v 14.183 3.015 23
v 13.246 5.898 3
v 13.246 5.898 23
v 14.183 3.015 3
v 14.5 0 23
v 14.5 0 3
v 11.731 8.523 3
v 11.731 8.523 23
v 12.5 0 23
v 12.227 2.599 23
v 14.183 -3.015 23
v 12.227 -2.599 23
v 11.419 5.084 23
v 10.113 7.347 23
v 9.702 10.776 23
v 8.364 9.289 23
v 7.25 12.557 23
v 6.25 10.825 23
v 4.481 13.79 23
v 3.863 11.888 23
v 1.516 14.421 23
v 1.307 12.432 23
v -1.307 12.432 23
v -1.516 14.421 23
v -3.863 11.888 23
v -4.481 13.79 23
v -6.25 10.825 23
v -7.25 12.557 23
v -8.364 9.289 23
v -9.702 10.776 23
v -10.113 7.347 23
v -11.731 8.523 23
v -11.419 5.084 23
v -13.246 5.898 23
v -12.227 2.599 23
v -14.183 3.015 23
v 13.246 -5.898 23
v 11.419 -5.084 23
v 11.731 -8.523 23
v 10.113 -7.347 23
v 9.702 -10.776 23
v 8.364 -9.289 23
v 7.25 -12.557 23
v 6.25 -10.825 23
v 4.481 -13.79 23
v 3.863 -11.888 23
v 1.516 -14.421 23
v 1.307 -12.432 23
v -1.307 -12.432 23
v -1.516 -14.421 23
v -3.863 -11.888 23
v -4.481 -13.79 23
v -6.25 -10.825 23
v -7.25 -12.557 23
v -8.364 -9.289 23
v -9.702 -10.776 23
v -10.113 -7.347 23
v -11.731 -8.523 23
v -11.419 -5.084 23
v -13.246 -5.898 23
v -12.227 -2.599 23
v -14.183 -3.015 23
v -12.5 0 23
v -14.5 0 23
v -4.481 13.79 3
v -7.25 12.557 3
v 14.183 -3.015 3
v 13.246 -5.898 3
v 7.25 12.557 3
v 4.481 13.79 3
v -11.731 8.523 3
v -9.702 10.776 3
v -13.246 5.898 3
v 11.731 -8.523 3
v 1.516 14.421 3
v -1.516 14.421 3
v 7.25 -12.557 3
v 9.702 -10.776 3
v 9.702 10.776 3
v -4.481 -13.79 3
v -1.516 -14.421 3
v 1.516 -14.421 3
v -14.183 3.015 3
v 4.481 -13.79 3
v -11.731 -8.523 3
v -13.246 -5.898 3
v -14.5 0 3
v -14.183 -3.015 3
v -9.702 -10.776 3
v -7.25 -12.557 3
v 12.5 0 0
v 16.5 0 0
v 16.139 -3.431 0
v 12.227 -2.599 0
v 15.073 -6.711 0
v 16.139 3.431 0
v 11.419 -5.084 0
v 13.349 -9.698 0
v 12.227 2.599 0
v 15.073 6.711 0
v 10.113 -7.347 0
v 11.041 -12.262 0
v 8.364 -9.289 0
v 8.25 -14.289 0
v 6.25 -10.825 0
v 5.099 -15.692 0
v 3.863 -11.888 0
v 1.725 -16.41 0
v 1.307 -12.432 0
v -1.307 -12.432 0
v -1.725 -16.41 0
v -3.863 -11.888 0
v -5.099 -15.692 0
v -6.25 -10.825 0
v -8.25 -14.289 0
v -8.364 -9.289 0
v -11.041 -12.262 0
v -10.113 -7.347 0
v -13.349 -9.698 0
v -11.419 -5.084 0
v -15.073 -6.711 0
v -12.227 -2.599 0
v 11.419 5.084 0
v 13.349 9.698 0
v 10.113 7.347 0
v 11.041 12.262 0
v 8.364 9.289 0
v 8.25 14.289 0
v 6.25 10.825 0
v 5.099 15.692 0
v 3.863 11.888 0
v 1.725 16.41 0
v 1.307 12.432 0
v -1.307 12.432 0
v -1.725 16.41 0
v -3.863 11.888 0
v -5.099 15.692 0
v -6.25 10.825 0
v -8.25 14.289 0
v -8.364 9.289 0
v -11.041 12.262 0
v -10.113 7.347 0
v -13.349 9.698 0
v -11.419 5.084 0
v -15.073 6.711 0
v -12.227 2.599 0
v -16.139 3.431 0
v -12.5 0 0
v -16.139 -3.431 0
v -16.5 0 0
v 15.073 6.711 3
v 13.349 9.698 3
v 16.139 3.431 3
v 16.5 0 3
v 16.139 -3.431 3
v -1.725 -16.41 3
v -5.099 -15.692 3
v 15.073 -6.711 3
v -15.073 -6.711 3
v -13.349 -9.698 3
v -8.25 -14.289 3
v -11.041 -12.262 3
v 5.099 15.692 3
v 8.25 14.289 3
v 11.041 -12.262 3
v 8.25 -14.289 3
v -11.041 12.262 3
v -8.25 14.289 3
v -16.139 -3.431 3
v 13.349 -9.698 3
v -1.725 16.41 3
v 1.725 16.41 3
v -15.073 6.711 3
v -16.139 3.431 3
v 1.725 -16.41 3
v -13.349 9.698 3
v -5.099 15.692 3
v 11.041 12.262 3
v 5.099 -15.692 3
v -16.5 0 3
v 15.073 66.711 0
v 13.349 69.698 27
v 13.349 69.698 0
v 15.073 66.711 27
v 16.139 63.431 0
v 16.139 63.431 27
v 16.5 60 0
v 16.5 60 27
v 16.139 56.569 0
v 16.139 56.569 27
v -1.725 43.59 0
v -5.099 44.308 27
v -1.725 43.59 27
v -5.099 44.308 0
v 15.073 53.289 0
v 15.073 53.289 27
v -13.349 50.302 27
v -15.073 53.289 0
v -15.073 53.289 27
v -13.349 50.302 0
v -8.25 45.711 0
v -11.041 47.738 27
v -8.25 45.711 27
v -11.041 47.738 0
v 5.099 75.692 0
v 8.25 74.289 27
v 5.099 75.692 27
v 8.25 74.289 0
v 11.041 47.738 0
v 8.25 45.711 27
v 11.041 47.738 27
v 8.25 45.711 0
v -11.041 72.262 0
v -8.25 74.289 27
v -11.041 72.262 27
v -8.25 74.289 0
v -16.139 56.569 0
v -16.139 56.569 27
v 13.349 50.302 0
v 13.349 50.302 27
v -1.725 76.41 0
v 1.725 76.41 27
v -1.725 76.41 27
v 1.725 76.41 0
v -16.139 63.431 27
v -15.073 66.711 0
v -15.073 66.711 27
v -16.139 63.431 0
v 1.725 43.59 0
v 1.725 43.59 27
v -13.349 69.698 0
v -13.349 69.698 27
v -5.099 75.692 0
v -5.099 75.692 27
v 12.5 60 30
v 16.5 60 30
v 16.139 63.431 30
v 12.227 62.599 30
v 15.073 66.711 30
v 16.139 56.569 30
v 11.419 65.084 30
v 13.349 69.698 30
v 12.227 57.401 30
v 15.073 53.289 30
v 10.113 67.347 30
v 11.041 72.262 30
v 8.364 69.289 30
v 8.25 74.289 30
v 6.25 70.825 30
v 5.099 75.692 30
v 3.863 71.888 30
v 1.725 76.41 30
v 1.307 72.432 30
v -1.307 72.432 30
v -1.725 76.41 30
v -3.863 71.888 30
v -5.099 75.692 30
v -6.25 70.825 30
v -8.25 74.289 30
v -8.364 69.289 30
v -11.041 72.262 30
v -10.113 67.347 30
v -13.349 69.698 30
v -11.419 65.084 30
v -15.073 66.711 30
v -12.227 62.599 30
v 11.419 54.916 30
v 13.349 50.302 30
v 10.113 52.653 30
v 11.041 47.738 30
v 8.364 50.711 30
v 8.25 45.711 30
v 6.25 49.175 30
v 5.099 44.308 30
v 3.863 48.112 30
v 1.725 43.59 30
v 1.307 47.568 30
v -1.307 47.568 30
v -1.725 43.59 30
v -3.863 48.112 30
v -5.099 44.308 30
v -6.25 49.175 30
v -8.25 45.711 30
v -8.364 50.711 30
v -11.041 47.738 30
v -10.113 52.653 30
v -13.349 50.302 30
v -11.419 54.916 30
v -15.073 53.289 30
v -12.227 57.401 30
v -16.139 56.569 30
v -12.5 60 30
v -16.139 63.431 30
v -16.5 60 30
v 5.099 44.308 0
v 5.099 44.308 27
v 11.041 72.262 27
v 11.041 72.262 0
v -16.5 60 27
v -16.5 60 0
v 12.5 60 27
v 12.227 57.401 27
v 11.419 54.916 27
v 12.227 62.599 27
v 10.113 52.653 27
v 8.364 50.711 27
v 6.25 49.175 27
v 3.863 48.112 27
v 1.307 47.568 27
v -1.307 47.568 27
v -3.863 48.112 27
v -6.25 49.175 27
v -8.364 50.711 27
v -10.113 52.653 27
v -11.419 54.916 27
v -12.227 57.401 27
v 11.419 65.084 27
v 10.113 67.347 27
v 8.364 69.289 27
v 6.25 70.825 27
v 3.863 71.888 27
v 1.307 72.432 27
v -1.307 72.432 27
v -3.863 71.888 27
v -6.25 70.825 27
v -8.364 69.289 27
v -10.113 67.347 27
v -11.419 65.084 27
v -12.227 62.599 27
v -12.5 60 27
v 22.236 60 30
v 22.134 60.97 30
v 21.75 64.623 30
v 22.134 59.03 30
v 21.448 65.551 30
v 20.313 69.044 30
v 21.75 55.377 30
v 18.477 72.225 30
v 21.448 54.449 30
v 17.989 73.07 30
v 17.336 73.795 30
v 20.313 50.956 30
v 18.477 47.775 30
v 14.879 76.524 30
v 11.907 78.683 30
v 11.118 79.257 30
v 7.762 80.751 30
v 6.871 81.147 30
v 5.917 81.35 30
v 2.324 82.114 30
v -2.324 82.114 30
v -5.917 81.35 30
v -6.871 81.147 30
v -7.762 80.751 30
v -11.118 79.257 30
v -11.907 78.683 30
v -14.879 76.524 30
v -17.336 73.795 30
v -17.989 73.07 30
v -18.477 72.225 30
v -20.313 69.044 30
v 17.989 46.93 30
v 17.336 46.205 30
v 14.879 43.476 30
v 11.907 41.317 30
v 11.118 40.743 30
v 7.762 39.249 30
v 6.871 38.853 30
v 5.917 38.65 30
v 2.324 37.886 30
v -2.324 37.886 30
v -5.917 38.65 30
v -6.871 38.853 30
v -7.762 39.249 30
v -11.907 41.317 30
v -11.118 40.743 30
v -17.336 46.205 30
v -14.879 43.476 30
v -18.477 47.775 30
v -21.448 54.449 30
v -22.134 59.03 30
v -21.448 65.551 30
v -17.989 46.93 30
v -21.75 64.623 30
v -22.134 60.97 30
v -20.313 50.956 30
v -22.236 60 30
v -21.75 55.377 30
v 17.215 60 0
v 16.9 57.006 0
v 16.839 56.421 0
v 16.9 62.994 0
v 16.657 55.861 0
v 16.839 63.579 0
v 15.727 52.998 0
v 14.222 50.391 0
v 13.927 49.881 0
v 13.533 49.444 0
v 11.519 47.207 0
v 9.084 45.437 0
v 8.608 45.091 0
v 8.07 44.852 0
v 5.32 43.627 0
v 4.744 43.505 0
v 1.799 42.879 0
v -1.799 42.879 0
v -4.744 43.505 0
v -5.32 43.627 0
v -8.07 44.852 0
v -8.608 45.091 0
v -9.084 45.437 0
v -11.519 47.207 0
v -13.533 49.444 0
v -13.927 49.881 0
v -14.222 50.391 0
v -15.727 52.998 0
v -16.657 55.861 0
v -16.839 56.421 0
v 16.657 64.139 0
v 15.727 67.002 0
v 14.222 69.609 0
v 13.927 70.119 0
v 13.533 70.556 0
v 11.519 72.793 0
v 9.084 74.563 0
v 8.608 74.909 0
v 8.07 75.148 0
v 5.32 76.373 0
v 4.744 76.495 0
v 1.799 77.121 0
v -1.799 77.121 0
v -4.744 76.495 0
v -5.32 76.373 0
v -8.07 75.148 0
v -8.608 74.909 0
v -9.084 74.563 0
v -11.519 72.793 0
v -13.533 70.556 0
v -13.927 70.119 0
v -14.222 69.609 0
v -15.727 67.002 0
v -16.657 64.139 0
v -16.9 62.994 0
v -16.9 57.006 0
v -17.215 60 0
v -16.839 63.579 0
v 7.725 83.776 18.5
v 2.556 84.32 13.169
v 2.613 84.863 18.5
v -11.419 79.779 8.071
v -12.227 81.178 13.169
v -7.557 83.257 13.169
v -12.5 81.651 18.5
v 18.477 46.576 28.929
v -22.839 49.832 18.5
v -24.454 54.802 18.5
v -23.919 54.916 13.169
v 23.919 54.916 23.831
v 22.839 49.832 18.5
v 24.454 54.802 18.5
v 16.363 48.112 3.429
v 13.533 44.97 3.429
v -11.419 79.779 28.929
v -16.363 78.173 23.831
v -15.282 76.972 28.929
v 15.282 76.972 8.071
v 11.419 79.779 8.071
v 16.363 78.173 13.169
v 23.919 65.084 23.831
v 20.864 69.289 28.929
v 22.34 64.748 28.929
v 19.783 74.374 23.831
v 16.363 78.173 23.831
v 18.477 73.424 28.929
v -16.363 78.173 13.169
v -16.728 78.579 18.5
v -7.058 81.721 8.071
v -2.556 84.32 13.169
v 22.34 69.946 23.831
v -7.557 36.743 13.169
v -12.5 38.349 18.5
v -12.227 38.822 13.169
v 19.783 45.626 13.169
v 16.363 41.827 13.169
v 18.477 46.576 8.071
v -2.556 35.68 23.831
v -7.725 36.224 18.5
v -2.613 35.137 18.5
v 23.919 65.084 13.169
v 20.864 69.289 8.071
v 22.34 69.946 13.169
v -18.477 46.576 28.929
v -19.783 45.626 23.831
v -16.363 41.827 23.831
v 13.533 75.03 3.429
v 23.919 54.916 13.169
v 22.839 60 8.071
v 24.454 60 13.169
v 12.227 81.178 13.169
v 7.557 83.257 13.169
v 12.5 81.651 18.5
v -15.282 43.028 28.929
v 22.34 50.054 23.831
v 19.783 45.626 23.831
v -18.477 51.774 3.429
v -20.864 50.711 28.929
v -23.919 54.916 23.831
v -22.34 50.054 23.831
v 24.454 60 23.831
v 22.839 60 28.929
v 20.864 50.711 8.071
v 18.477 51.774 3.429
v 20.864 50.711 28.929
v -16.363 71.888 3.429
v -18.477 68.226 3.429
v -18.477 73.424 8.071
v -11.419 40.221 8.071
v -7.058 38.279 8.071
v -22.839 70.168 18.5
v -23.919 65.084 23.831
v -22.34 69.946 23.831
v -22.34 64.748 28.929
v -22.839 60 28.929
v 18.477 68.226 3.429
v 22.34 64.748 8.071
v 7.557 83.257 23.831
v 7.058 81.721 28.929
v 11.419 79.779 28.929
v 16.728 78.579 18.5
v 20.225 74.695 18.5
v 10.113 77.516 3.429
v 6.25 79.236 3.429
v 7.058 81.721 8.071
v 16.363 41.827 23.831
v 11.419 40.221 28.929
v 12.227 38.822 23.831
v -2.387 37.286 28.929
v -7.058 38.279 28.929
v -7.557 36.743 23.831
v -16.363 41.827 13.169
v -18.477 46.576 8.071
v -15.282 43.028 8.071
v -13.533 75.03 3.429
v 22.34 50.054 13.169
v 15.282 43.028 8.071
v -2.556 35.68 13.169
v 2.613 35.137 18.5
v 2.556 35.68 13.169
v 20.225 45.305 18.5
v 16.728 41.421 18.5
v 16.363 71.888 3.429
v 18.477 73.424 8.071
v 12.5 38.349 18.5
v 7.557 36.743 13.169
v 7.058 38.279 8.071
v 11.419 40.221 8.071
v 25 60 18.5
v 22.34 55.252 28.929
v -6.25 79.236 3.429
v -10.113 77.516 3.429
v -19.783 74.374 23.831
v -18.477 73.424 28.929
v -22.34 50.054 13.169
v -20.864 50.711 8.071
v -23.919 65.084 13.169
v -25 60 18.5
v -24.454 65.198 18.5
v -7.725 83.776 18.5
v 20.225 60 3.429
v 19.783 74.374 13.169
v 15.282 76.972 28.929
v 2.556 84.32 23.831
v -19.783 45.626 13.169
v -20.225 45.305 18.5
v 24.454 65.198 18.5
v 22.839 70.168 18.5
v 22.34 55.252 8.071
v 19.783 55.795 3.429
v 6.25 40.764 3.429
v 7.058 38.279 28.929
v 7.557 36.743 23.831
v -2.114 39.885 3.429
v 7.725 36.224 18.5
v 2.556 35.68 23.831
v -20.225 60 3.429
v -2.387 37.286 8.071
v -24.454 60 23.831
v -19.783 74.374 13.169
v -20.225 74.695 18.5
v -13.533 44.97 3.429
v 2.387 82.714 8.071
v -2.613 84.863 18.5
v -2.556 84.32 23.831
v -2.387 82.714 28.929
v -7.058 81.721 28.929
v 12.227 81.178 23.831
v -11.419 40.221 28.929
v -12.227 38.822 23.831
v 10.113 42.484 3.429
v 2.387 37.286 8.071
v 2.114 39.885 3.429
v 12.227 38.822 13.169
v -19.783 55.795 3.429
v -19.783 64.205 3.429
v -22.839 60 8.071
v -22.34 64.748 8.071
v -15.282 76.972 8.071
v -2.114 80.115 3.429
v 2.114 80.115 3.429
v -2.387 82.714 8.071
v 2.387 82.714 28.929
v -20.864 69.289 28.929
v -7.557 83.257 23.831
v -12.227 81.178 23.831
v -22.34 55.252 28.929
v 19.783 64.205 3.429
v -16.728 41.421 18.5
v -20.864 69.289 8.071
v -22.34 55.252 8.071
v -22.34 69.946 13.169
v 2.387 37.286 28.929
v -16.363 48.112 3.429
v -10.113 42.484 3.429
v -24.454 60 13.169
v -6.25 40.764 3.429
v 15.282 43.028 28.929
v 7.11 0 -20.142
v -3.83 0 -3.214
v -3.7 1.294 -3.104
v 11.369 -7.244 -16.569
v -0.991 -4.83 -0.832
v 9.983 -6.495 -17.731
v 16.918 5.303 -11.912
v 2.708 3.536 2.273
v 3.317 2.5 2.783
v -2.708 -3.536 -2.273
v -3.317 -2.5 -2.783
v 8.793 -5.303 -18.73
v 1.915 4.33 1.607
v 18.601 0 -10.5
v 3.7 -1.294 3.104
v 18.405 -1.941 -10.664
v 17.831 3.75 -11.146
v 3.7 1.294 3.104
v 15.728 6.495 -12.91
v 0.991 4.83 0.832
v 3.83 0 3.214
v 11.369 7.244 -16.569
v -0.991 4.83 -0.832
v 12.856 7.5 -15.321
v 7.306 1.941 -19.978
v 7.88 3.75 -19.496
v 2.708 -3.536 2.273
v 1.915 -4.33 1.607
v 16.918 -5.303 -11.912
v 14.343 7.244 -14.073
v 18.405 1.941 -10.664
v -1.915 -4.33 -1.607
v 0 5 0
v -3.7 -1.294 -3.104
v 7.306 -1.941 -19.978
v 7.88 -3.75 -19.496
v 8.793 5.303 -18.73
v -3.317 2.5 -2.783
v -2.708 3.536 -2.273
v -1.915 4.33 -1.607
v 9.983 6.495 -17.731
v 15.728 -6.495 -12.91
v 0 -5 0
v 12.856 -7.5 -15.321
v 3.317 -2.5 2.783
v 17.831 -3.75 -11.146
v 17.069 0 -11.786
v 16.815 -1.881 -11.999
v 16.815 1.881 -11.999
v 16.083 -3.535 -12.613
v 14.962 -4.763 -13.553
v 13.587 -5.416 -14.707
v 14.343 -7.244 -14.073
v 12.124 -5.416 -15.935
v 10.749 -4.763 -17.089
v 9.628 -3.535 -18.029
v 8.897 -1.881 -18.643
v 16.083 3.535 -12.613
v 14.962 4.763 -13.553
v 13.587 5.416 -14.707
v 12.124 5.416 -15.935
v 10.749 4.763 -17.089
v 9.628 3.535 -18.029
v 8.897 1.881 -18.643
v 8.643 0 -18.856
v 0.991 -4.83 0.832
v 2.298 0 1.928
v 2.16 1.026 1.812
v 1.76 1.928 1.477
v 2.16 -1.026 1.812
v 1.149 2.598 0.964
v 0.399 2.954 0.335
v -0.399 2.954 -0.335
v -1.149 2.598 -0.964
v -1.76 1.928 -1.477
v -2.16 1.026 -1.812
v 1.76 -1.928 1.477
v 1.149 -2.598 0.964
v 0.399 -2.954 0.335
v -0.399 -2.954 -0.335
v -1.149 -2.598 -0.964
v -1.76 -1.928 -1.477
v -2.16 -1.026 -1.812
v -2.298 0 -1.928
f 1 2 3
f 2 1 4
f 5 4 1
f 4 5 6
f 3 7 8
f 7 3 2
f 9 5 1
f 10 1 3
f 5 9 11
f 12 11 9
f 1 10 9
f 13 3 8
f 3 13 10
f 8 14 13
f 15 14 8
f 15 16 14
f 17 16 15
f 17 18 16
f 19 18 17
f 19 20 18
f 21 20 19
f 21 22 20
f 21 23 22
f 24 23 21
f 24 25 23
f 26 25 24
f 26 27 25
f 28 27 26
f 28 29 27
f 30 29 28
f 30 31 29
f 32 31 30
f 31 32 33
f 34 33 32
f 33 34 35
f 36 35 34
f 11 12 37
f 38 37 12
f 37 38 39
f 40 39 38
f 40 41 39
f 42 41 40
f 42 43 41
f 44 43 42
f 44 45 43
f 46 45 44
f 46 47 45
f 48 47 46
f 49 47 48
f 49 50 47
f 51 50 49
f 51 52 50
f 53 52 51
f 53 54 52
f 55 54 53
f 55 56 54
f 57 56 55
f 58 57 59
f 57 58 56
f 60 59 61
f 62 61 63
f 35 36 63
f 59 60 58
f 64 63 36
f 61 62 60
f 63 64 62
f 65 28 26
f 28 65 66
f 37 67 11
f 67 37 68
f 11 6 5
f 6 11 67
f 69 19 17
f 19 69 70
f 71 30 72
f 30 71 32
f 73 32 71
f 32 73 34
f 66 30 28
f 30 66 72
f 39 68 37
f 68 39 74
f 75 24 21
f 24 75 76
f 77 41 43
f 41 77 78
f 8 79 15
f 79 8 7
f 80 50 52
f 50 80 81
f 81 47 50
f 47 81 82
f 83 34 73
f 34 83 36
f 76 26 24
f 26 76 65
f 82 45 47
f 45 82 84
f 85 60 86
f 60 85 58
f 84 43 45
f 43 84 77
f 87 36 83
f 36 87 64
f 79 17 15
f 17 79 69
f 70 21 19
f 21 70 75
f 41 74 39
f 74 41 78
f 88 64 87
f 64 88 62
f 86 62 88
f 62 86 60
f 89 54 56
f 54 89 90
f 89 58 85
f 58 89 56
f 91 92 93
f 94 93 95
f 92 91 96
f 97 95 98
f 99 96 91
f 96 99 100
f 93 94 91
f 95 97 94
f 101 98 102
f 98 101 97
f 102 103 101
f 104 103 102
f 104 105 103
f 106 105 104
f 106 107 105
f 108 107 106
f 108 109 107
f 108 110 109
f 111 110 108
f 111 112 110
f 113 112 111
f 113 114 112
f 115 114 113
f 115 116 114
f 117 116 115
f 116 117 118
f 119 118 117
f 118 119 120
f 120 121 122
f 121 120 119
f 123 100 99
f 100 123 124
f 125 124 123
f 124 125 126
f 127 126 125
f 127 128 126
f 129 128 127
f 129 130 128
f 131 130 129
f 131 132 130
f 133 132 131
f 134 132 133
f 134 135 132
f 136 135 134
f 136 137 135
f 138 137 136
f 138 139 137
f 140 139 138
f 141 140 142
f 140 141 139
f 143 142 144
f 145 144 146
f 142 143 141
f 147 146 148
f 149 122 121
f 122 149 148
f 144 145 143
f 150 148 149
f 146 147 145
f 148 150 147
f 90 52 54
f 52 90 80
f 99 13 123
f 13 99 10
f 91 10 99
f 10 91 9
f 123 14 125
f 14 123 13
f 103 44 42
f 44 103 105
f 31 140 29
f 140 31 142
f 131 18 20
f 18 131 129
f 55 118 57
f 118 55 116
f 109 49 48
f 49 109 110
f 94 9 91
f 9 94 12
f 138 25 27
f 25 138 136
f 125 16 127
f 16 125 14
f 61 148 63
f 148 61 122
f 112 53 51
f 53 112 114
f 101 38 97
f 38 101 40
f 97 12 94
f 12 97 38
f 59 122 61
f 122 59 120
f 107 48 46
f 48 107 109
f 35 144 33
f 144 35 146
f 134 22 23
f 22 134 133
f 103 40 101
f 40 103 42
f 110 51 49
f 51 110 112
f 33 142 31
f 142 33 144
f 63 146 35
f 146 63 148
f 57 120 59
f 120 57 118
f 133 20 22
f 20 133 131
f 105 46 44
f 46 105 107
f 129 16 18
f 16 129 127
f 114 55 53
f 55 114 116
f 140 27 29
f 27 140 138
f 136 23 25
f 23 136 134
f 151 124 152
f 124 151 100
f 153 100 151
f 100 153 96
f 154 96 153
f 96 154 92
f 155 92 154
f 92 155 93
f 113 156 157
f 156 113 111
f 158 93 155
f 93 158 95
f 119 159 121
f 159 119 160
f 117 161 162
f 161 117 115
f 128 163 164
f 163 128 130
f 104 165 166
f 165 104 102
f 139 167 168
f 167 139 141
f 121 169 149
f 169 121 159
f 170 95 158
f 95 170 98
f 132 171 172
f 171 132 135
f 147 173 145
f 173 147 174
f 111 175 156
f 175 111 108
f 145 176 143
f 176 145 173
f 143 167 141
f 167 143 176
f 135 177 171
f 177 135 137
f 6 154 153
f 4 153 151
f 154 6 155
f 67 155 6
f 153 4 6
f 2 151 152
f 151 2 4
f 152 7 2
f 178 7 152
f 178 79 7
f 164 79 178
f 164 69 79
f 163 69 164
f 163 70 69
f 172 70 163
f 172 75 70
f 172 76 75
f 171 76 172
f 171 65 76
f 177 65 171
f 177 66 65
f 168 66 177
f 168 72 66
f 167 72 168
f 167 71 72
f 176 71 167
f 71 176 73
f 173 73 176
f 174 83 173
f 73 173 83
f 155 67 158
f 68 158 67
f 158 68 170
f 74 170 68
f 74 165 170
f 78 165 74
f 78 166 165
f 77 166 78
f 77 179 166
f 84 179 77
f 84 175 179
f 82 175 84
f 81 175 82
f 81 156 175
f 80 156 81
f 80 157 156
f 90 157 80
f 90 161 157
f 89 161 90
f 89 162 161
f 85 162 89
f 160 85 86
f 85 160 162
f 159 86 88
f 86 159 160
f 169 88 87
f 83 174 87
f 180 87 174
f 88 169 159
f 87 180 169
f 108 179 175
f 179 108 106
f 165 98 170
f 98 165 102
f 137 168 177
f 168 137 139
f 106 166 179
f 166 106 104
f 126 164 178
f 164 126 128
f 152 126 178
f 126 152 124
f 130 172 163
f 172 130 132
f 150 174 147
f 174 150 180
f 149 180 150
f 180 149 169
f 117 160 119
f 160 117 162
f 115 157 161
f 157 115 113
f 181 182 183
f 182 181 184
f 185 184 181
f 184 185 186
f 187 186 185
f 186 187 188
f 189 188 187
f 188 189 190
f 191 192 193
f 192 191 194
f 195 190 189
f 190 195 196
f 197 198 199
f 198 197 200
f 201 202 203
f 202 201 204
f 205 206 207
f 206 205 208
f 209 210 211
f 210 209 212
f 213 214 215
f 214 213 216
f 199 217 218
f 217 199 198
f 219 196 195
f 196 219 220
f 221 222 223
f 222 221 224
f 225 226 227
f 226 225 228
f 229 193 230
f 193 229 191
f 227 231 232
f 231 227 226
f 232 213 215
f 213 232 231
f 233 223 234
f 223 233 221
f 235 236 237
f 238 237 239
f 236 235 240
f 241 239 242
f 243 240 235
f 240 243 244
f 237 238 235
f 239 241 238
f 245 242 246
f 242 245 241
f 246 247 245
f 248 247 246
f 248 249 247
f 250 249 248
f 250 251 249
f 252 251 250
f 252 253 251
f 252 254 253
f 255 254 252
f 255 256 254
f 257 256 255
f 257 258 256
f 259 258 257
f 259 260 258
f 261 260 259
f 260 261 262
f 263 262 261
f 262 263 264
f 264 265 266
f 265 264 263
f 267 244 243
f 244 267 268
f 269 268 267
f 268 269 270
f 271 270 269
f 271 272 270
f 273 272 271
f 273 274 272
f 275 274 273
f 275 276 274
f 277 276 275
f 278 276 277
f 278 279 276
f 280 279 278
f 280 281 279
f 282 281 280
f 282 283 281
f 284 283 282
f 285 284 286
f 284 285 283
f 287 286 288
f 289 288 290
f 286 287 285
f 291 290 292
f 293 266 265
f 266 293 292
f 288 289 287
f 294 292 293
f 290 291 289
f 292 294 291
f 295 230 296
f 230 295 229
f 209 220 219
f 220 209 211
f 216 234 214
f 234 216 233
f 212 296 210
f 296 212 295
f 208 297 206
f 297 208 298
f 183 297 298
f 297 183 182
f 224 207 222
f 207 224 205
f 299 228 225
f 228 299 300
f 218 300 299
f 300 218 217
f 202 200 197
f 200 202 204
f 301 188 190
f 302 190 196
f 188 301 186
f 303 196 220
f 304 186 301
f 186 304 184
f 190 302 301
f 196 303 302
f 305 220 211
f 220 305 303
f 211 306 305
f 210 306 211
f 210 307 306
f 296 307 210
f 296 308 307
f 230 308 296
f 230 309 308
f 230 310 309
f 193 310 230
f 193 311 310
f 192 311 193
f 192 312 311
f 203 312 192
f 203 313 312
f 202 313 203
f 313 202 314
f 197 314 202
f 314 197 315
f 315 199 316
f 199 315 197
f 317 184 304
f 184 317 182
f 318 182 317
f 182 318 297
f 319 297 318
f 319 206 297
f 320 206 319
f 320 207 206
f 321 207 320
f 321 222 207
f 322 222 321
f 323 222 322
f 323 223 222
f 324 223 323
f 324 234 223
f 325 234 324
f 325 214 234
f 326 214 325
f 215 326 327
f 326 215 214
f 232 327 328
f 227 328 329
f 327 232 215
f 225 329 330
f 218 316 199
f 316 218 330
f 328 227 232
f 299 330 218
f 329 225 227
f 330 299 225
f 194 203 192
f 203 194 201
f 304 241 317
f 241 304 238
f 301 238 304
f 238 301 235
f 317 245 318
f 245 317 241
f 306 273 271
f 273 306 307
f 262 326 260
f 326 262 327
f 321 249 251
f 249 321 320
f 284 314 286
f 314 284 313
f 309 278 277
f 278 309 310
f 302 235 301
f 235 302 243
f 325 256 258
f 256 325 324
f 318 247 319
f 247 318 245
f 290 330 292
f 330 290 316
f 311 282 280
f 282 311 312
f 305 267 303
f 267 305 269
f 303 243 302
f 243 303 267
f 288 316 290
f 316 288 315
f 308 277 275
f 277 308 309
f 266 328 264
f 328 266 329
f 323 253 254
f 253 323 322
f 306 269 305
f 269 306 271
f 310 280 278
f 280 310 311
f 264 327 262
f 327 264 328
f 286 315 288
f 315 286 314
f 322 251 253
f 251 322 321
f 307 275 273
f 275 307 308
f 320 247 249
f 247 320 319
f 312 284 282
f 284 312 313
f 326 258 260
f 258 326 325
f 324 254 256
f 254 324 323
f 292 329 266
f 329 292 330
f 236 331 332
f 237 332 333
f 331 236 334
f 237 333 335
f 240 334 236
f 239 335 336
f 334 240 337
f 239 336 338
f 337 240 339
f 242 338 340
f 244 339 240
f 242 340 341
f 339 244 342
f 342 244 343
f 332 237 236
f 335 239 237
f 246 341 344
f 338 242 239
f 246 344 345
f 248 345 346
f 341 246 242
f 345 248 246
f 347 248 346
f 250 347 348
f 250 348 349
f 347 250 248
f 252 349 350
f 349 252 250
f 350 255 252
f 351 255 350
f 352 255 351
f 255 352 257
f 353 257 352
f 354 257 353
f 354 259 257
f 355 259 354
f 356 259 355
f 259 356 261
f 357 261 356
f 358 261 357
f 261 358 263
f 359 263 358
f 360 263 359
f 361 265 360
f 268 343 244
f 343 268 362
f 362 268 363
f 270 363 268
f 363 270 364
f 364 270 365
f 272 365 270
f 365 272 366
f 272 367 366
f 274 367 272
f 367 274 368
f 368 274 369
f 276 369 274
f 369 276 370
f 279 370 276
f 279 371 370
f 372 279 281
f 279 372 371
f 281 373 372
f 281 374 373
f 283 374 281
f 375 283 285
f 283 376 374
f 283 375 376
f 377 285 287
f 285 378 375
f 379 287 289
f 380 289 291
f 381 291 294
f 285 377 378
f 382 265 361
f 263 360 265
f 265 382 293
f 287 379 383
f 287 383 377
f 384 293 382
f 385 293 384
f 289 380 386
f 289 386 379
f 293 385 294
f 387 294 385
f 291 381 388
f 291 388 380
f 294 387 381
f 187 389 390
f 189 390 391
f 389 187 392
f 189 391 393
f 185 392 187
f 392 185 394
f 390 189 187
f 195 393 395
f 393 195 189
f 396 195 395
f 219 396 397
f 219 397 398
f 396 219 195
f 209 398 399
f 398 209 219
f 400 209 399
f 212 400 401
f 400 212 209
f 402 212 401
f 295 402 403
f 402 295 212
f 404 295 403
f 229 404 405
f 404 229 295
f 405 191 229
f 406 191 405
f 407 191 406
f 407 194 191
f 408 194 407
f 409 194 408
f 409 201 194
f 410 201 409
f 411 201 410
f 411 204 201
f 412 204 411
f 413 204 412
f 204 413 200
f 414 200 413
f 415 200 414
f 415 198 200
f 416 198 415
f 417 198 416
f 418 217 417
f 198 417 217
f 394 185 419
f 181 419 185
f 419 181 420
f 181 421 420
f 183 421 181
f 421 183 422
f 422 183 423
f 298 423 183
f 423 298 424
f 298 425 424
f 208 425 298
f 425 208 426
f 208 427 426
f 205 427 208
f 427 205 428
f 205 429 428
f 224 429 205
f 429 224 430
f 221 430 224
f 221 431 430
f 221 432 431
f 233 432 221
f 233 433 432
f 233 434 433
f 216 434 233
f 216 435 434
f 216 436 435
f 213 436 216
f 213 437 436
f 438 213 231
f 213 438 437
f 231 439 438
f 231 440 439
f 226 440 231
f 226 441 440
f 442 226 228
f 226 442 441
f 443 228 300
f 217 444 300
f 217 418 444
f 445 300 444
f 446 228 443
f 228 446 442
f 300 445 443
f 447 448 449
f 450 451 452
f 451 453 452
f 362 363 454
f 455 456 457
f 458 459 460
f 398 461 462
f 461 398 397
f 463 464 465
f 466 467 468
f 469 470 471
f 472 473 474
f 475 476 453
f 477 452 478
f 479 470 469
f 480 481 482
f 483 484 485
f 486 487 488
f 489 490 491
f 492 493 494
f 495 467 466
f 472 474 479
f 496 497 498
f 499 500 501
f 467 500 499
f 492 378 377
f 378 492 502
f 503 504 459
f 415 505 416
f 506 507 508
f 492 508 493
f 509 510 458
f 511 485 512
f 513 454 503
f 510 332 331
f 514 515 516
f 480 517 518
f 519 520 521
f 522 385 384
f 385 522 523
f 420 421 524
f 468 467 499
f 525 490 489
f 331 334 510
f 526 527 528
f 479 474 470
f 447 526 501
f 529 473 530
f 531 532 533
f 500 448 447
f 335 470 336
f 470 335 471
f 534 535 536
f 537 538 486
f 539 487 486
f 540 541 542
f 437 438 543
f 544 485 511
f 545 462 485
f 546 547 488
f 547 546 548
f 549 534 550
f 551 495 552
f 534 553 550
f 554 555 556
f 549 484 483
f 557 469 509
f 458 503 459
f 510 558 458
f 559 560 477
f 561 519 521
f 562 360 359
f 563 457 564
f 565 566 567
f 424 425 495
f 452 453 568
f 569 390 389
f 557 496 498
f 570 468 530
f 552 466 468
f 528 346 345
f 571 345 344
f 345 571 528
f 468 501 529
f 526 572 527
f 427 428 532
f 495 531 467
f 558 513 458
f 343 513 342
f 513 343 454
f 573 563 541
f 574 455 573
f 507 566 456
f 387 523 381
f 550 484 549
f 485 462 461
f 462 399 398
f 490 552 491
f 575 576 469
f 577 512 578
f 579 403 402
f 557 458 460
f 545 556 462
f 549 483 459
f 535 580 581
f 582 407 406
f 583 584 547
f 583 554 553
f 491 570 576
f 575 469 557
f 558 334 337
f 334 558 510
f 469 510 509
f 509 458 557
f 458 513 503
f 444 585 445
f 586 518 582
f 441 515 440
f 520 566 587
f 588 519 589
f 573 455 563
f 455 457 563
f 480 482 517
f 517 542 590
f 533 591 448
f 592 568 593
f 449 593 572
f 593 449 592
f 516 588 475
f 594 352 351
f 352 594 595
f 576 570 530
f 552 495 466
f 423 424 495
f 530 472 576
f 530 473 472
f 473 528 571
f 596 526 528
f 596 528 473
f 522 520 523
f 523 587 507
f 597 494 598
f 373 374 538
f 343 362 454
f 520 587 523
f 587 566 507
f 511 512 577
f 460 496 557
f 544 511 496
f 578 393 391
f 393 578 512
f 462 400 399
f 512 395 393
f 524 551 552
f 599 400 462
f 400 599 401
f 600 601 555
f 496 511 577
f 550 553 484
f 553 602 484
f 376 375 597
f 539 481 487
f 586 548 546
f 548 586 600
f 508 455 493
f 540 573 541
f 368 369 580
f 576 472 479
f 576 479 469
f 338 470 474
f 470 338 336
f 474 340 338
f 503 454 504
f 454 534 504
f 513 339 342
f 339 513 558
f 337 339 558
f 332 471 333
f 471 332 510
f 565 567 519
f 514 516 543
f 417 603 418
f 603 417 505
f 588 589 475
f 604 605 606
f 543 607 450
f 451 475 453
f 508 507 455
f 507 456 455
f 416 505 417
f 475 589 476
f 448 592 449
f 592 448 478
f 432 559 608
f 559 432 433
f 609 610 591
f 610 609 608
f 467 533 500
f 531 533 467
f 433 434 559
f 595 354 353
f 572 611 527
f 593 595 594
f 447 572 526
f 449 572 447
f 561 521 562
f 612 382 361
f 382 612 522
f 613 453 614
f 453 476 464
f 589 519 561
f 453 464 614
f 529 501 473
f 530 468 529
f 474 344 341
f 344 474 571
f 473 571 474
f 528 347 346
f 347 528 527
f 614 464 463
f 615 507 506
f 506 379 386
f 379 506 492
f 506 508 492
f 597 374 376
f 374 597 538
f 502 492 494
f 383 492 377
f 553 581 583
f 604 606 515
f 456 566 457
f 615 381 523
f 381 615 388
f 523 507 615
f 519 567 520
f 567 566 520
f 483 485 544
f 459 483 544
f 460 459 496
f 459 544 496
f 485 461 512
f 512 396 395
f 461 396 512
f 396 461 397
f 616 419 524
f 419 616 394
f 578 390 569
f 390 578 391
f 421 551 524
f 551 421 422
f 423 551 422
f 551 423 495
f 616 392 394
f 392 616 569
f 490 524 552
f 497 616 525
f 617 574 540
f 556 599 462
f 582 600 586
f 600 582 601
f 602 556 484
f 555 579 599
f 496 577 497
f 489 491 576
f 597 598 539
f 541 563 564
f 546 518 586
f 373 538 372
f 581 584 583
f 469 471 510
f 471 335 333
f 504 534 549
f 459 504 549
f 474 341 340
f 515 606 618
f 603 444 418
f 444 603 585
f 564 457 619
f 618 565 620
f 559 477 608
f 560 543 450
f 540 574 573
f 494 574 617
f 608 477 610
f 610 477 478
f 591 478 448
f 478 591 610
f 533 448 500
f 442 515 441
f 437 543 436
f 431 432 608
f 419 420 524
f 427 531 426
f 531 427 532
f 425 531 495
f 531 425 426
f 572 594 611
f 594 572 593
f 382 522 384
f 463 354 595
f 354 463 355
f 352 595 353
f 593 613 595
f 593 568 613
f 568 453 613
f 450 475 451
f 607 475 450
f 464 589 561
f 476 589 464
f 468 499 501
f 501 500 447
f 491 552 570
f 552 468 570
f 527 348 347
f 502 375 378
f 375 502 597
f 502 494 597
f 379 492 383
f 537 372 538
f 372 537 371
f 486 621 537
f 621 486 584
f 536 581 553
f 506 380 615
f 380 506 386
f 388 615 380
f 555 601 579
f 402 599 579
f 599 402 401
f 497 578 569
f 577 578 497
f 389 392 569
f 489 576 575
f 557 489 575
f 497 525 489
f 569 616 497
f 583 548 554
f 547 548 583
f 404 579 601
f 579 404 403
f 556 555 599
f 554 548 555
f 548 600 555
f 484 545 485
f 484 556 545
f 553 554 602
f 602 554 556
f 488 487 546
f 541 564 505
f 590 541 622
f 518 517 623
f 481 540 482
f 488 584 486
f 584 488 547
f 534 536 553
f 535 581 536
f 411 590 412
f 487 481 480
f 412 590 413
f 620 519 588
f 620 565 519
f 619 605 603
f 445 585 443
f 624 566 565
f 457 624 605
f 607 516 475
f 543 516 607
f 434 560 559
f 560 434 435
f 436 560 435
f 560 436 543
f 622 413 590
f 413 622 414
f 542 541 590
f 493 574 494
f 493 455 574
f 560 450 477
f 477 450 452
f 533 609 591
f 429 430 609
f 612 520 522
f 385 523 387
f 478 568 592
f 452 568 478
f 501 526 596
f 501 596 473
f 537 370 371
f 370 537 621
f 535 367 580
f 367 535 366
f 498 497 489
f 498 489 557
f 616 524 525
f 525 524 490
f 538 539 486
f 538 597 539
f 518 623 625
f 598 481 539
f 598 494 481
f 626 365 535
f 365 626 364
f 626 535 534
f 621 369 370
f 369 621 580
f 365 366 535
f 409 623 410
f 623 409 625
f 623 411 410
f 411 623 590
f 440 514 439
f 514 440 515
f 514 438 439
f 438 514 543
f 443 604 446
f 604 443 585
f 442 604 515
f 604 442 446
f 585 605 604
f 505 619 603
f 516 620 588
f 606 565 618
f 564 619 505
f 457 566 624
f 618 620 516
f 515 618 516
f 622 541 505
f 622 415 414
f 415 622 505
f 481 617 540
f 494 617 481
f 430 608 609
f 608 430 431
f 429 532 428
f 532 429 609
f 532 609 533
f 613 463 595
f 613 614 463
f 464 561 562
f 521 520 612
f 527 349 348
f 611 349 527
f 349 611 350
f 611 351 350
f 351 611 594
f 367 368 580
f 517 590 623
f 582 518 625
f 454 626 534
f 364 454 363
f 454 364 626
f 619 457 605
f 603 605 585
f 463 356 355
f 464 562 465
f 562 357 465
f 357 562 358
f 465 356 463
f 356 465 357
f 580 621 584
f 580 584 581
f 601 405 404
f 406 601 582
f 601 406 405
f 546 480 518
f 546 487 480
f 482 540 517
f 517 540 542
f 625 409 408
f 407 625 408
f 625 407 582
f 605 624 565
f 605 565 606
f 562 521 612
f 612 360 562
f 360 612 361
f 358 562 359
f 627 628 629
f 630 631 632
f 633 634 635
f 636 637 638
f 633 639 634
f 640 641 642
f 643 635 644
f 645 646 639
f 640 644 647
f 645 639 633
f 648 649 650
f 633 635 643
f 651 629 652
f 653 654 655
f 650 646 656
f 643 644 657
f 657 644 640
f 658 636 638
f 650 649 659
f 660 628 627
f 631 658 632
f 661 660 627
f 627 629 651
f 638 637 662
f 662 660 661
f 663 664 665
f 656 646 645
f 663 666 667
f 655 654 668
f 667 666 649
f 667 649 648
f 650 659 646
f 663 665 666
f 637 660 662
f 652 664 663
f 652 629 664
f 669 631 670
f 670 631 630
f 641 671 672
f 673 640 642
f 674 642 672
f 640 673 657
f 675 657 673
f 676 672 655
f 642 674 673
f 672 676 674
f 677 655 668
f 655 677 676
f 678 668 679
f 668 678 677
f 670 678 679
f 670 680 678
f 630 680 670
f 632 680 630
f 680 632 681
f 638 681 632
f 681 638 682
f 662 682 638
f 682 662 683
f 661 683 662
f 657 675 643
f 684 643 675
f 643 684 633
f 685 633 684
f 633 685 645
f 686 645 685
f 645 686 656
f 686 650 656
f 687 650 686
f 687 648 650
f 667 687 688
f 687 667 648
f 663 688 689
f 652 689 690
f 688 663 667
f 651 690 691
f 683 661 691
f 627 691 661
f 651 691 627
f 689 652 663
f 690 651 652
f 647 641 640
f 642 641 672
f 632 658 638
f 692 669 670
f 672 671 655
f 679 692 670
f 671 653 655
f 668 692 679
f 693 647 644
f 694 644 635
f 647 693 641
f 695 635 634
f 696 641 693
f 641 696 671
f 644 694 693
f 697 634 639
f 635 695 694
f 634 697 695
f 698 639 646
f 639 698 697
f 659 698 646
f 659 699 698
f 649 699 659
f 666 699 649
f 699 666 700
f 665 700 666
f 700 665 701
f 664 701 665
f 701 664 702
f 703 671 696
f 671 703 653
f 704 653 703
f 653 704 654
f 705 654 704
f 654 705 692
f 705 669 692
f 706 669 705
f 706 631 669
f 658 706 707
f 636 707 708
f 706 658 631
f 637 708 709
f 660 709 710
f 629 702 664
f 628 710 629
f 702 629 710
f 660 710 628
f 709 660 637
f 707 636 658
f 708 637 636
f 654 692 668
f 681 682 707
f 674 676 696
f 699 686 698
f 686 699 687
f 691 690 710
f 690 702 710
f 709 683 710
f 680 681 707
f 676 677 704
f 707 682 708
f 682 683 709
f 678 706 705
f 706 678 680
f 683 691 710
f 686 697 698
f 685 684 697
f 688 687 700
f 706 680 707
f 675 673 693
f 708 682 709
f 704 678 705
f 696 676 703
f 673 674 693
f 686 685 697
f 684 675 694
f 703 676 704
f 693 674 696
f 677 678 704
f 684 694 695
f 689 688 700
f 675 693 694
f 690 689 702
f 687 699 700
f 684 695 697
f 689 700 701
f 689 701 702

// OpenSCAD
/*Leone Ermer
Faucet Drinking Fountain
2013 3D Fabrication

Notes:
	Make Faucet Attachment infill normal
	Make Fountain infill zero // support first 13 layers?

To Do List:
	Print
	Make Spout
	Figure out Sizing and Print Controls
	Plumbers Tape
	
*/

//
//Basic Controls
//
	//Display Parts
		faucetAttachment = true;
		fountain = true;

	//Faucet Attachment (Thermochromic PLA)
		faucetDiameter = 25; //Diameter of inner circle
		attachmentHeight = 23;
		attachmentThickness = 2;
		
	//Fountain (Soft PLA)
		fountainHeight = 30;
		fountainWidth = 50;
		fountainSpoutDiameter1 = 10;
		fountainSpoutDiameter2 = 15;
		fountainSpoutLength = 20;
		fountainSpoutThickness = attachmentThickness;
			
//
//Secondary Controls
//
	//Connecter Ridge
		ridgeThickness = 2;
		ridgeHeight = 3;
	
	
	//Don't Touch
		faucetRadius = (faucetDiameter/2);
		faRadius = (faucetRadius + attachmentThickness);
		ridgeRadius = (faRadius + ridgeThickness);
		fountainRadius = (fountainWidth/2);
		fountainOval = (fountainHeight + ((fountainHeight)*.7));
		fountainCutoff1 = (((fountainHeight*.7)/3)*2);
		fountainCutoff2 = ((fountainHeight*.7)/3);
		fountainSpoutRadius1 = (fountainSpoutDiameter1/2);
		fountainSpoutRadius2 = (fountainSpoutDiameter2/2);
		
//	
//Build
//

if(faucetAttachment == true){
	faucetAttachment();
	connecterRidge();
}

if(fountain == true){
	translate([0,60,0])
	fountain();
	fountainSpout();
}

//
// Modules
//

module faucetAttachment(){
	difference(){
		cylinder(attachmentHeight,faRadius,faRadius);
		cylinder(attachmentHeight,faucetRadius,faucetRadius);
	}
}

module connecterRidge(){
	difference(){
		cylinder(ridgeHeight,ridgeRadius,ridgeRadius);
		cylinder(ridgeHeight,faucetRadius,faucetRadius);
	}
}

module fountain(){
	translate([0,0,(fountainHeight-ridgeHeight)])
	connecterRidge();
	translate([0,0,-fountainCutoff2])
	difference(){
		translate([0,0,(fountainOval/2)]) resize([0,0,fountainOval]) 
		sphere(fountainRadius);
		fountainCutouts();
	}
}

module fountainCutouts(){
		translate([0,0,(fountainCutoff2)])
		cylinder(fountainHeight,ridgeRadius,ridgeRadius); //Inner Cylinder
		cylinder(fountainCutoff2,60,60); //Bottom Cutout
		translate([0,0,(fountainOval-fountainCutoff1)]) 
		cylinder(fountainCutoff1,60,60); //Top Cutout
}

module fountainSpout(){
	translate([0,0,0])
	rotate([0, 140, 0])
	difference(){
		cylinder(fountainSpoutLength,fountainSpoutRadius1,fountainSpoutRadius2);
		cylinder(fountainSpoutLength,(fountainSpoutRadius1-fountainSpoutThickness),(fountainSpoutRadius2-fountainSpoutThickness));
		}
}
